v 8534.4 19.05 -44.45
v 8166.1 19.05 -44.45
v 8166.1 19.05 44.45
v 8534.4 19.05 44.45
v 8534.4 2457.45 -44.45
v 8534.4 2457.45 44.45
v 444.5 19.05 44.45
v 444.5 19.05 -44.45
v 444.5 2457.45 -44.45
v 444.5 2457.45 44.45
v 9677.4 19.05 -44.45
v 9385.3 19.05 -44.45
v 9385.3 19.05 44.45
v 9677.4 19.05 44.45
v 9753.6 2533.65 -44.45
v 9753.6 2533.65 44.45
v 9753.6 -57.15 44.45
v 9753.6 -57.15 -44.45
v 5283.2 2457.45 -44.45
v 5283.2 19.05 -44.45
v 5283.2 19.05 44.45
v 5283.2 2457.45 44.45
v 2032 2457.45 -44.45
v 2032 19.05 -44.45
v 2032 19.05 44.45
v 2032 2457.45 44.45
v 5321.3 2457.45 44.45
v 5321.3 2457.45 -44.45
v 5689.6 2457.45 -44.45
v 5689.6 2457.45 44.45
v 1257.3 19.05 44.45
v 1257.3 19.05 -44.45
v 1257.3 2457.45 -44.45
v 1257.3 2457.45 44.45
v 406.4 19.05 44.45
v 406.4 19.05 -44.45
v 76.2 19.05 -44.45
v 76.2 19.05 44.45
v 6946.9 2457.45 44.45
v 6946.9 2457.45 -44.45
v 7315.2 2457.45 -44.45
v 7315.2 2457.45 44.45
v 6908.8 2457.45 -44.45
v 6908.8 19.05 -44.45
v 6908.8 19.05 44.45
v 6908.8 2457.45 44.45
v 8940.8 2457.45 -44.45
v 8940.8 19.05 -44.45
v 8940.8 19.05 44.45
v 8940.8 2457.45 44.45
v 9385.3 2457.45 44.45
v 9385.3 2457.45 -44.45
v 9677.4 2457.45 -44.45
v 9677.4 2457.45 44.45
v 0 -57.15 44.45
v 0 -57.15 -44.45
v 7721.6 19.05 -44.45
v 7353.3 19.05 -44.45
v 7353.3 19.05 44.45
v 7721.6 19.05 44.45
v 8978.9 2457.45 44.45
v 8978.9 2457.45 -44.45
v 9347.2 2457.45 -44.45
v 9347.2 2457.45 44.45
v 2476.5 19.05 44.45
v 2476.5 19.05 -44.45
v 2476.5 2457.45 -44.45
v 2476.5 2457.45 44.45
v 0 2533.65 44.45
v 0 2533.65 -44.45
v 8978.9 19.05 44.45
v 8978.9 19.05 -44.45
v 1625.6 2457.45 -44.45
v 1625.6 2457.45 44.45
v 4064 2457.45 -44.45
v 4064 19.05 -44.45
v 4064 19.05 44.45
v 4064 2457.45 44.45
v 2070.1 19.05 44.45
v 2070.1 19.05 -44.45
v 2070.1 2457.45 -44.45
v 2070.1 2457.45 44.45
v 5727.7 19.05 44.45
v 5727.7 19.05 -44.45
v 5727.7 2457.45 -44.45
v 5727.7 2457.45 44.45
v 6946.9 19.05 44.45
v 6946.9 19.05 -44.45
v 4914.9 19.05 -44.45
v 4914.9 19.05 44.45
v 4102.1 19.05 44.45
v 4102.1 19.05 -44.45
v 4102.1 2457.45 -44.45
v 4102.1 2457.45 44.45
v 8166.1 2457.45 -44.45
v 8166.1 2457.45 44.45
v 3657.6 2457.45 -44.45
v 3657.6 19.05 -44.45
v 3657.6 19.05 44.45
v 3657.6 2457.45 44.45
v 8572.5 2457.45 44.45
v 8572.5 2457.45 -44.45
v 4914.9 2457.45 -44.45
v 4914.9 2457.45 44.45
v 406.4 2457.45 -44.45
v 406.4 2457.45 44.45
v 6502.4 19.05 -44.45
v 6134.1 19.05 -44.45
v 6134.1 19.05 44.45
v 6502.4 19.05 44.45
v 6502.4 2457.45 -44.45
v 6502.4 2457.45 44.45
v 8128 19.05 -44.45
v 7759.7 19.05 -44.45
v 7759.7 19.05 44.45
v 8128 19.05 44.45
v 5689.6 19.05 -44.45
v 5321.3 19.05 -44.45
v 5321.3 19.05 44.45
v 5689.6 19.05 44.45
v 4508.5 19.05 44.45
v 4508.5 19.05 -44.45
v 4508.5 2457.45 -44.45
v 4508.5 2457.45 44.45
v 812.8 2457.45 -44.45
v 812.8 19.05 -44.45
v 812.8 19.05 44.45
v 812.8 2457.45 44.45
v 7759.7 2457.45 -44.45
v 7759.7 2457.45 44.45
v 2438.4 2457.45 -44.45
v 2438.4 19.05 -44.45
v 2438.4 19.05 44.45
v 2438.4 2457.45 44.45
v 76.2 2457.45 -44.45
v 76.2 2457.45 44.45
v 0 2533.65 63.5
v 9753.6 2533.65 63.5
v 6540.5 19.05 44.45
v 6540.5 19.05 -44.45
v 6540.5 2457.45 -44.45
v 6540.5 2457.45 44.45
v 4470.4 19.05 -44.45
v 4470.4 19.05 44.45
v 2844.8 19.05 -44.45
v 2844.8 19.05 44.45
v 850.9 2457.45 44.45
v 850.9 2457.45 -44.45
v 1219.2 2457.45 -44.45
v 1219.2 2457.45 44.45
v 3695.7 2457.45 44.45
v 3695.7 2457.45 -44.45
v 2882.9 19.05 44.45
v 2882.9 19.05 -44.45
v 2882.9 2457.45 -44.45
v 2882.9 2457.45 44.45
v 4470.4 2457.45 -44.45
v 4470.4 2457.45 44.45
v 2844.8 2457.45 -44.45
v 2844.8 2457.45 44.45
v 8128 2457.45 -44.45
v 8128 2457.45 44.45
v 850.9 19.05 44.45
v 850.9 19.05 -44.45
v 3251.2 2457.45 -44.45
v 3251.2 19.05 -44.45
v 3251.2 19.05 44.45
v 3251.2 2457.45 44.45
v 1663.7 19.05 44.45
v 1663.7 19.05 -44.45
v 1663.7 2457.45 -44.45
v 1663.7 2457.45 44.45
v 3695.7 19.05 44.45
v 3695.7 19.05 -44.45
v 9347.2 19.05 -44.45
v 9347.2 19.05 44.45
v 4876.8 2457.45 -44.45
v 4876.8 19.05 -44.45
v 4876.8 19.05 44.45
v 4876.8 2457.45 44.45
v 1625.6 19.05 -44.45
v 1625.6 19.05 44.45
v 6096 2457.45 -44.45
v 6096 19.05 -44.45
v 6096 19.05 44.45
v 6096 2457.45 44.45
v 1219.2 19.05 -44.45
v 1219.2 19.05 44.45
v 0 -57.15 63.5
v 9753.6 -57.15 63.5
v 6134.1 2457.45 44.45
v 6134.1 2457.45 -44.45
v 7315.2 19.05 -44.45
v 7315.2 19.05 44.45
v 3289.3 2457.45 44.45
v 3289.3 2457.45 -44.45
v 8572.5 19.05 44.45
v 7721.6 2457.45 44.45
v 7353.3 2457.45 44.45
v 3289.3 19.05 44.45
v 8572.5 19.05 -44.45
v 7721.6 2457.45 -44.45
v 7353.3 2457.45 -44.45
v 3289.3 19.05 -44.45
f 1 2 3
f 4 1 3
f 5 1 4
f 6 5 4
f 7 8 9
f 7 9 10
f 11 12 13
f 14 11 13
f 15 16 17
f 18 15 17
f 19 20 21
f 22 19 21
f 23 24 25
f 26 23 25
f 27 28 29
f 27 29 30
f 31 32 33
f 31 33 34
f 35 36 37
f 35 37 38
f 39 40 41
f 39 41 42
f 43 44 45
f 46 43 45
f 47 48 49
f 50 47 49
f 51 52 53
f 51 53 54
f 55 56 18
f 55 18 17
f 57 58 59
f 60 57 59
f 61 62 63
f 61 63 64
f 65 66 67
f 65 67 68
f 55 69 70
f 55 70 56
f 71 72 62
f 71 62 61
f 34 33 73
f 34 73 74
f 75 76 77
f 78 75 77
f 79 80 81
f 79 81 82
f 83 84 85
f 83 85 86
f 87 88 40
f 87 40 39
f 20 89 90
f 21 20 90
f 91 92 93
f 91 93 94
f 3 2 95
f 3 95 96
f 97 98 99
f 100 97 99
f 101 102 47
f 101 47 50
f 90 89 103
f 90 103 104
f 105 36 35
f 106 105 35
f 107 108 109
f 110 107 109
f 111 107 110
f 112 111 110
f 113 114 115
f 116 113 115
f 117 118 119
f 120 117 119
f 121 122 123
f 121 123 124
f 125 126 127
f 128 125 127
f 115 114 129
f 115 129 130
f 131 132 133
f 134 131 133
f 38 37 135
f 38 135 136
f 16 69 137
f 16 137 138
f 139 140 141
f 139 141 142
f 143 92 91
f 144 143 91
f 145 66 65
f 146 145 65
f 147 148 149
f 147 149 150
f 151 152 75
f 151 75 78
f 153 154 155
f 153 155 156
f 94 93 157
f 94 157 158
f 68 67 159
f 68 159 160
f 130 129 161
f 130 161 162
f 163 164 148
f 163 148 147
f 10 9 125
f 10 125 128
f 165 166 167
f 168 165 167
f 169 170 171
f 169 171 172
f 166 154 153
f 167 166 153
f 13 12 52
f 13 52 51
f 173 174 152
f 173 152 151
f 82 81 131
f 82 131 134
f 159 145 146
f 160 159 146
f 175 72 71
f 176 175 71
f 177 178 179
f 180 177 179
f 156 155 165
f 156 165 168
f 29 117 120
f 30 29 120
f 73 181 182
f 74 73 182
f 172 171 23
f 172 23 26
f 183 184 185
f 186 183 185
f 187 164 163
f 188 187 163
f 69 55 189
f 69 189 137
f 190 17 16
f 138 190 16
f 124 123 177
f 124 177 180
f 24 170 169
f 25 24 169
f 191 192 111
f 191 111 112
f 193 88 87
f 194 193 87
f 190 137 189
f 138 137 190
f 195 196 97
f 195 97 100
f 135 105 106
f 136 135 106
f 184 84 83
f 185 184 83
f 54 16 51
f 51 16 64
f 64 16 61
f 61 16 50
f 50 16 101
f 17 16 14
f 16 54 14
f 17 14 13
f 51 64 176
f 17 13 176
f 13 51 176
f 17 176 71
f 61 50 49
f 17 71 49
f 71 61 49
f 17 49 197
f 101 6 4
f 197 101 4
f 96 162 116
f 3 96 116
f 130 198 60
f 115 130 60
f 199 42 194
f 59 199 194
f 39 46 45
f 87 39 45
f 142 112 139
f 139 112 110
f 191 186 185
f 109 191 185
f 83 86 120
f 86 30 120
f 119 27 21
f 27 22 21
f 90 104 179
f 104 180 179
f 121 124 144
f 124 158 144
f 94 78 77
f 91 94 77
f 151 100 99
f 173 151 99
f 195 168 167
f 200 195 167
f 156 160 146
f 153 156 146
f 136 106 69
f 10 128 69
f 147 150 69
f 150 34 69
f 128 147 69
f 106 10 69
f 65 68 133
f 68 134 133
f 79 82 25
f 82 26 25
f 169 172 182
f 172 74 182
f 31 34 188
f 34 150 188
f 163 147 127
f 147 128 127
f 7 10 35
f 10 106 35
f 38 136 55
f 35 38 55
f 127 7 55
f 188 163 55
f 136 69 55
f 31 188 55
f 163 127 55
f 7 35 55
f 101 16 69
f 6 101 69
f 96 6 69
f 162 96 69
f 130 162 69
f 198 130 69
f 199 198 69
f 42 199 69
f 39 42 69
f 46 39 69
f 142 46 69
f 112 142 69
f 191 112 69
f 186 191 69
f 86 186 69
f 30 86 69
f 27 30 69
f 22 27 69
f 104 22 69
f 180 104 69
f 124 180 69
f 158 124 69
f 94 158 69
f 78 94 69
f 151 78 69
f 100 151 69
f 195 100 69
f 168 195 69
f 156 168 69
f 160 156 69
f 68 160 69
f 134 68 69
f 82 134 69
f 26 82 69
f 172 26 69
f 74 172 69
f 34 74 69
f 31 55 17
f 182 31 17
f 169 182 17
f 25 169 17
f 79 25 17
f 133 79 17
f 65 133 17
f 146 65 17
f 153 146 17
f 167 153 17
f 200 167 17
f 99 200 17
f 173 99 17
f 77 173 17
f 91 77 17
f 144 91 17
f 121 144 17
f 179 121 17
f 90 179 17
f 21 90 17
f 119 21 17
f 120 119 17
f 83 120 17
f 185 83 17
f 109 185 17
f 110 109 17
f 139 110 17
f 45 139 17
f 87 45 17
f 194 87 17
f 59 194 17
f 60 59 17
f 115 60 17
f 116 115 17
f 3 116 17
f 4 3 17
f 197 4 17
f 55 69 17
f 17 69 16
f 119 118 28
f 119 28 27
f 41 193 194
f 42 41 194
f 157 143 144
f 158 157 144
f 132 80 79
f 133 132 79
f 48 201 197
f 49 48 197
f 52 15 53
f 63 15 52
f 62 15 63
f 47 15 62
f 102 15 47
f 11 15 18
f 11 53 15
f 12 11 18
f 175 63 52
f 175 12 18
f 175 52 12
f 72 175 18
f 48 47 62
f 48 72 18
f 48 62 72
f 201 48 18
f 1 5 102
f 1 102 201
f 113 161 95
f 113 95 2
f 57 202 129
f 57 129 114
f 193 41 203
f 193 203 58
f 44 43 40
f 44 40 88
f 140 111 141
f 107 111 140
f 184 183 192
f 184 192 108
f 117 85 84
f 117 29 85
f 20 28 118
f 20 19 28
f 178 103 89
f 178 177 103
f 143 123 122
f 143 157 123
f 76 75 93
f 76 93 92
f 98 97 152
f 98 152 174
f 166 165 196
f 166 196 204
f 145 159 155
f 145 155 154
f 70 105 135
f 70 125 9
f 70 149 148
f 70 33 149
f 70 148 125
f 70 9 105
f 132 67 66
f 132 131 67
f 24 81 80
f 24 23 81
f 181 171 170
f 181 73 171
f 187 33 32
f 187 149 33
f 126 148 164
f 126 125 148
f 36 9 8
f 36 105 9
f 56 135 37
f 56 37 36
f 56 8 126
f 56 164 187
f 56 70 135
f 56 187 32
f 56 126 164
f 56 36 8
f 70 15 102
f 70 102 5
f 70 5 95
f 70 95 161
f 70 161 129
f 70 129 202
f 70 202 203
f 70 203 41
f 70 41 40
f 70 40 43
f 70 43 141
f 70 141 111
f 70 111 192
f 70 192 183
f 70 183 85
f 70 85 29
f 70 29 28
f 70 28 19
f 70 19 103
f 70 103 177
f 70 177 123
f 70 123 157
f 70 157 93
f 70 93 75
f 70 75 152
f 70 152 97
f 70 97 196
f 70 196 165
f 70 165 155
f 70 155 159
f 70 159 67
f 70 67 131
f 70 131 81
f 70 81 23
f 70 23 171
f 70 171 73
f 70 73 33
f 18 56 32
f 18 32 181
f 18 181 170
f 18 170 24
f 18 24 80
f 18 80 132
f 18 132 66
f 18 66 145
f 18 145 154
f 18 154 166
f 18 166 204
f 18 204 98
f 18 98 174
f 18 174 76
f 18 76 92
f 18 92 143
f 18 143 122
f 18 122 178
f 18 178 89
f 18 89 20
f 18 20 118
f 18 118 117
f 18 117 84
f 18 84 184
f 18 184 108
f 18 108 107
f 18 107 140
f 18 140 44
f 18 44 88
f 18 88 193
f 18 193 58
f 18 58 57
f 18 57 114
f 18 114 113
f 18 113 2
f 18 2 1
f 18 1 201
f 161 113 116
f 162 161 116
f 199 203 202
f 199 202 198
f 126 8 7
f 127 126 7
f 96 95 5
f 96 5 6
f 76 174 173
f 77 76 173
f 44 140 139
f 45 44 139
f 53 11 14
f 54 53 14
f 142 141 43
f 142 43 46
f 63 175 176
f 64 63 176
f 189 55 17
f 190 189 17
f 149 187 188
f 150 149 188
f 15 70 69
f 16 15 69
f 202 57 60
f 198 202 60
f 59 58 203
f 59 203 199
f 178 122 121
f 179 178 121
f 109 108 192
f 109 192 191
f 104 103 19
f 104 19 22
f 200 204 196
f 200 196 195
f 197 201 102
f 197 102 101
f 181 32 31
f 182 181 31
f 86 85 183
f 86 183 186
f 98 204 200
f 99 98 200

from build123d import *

# Parameters (mm, degrees)
F0_W      = 38.1
F0_H      = 88.9
F1_DEPTH  = 9753.6
F2_W      = 38.1
F2_H      = 88.9
F3_DEPTH  = 2438.4
F4_W      = 76.2
F4_H      = 88.9
F5_DEPTH  = 2438.4
F6_W      = 38.1
F6_H      = 88.9
F7_DEPTH  = 2438.4
F8_DEPTH  = 38.1
F9_W      = 76.2
F9_H      = 88.9
F10_DEPTH = 9753.6
F11_W     = 9753.6
F11_H     = 2590.8
F12_DEPTH = 19.05


with BuildPart() as f1:
    # F0 (on Right) → F1 (new body)
    with BuildSketch(Plane.YZ):
        Rectangle(F0_W, F0_H)
    extrude(amount=F1_DEPTH)

    # F2 (on face) → F3 (join)
    with BuildSketch(Plane(origin=(0, 19.05, 0), x_dir=(-1, 0, 0), z_dir=(0, 1, 0))):
        with Locations((-9366.25, 0)):
            Rectangle(F2_W, F2_H)
        with Locations((-8959.85, 0)):
            Rectangle(F2_W, F2_H)
        with Locations((-8553.45, 0)):
            Rectangle(F2_W, F2_H)
        with Locations((-8147.05, 0)):
            Rectangle(F2_W, F2_H)
        with Locations((-7740.65, 0)):
            Rectangle(F2_W, F2_H)
        with Locations((-7334.25, 0)):
            Rectangle(F2_W, F2_H)
        with Locations((-6927.85, 0)):
            Rectangle(F2_W, F2_H)
        with Locations((-6521.45, 0)):
            Rectangle(F2_W, F2_H)
        with Locations((-6115.05, 0)):
            Rectangle(F2_W, F2_H)
        with Locations((-5708.65, 0)):
            Rectangle(F2_W, F2_H)
        with Locations((-5302.25, 0)):
            Rectangle(F2_W, F2_H)
        with Locations((-4895.85, 0)):
            Rectangle(F2_W, F2_H)
        with Locations((-4489.45, 0)):
            Rectangle(F2_W, F2_H)
        with Locations((-4083.05, 0)):
            Rectangle(F2_W, F2_H)
        with Locations((-3676.65, 0)):
            Rectangle(F2_W, F2_H)
        with Locations((-3270.25, 0)):
            Rectangle(F2_W, F2_H)
        with Locations((-2863.85, 0)):
            Rectangle(F2_W, F2_H)
        with Locations((-2457.45, 0)):
            Rectangle(F2_W, F2_H)
        with Locations((-2051.05, 0)):
            Rectangle(F2_W, F2_H)
        with Locations((-1644.65, 0)):
            Rectangle(F2_W, F2_H)
        with Locations((-1238.25, 0)):
            Rectangle(F2_W, F2_H)
        with Locations((-831.85, 0)):
            Rectangle(F2_W, F2_H)
        with Locations((-425.45, 0)):
            Rectangle(F2_W, F2_H)
        with Locations((-19.05, 0)):
            Rectangle(F2_W, F2_H)
    extrude(amount=F3_DEPTH)

    # F4 (on face) → F5 (join)
    with BuildSketch(Plane(origin=(0, 19.05, 0), x_dir=(-1, 0, 0), z_dir=(0, 1, 0))):
        with Locations((-9715.5, 0)):
            Rectangle(F4_W, F4_H)
    extrude(amount=F5_DEPTH)

    # F6 (on face) → F7 (join)
    with BuildSketch(Plane(origin=(0, 19.05, 0), x_dir=(-1, 0, 0), z_dir=(0, 1, 0))):
        with Locations((-57.15, 0)):
            Rectangle(F6_W, F6_H)
    extrude(amount=F7_DEPTH)

    # F8 (add): a face of the model
    f8_faces = [f1.faces().sort_by_distance(p)[0] for p in [
        (4876.8, -19.05, 0),
    ]]
    extrude(f8_faces, amount=F8_DEPTH)

    # F9 (on face) → F10 (join)
    with BuildSketch(Plane(origin=(0, 0, 0), x_dir=(0, -1, 0), z_dir=(-1, 0, 0))):
        with Locations((-2495.55, 0)):
            Rectangle(F9_W, F9_H)
    extrude(amount=-F10_DEPTH)


with BuildPart() as f12:
    # F11 (on face) → F12 (new body)
    with BuildSketch(Plane.XY.offset(44.45)):
        with Locations((4876.8, 1238.25)):
            Rectangle(F11_W, F11_H)
    extrude(amount=F12_DEPTH)


solid = Compound([f1.part, f12.part])
